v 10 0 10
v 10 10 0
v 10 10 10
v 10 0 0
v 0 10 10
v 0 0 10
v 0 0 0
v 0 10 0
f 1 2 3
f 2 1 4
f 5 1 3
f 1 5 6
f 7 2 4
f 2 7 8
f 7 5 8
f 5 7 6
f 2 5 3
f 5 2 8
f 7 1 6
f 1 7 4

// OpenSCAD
$fn=20;
#cube([10,10,10]);
translate([1,1,1]) sphere(1);

//minkowski() {
//cube([10,10,10]);
//color("blue") translate([1,1,1]) sphere(1);
//}

module m() {

minkowski() {
    cube([10,10,10]);
    //sphere(1);
    rotate([45,0,0])
    cylinder(2,2,2);
}
}
